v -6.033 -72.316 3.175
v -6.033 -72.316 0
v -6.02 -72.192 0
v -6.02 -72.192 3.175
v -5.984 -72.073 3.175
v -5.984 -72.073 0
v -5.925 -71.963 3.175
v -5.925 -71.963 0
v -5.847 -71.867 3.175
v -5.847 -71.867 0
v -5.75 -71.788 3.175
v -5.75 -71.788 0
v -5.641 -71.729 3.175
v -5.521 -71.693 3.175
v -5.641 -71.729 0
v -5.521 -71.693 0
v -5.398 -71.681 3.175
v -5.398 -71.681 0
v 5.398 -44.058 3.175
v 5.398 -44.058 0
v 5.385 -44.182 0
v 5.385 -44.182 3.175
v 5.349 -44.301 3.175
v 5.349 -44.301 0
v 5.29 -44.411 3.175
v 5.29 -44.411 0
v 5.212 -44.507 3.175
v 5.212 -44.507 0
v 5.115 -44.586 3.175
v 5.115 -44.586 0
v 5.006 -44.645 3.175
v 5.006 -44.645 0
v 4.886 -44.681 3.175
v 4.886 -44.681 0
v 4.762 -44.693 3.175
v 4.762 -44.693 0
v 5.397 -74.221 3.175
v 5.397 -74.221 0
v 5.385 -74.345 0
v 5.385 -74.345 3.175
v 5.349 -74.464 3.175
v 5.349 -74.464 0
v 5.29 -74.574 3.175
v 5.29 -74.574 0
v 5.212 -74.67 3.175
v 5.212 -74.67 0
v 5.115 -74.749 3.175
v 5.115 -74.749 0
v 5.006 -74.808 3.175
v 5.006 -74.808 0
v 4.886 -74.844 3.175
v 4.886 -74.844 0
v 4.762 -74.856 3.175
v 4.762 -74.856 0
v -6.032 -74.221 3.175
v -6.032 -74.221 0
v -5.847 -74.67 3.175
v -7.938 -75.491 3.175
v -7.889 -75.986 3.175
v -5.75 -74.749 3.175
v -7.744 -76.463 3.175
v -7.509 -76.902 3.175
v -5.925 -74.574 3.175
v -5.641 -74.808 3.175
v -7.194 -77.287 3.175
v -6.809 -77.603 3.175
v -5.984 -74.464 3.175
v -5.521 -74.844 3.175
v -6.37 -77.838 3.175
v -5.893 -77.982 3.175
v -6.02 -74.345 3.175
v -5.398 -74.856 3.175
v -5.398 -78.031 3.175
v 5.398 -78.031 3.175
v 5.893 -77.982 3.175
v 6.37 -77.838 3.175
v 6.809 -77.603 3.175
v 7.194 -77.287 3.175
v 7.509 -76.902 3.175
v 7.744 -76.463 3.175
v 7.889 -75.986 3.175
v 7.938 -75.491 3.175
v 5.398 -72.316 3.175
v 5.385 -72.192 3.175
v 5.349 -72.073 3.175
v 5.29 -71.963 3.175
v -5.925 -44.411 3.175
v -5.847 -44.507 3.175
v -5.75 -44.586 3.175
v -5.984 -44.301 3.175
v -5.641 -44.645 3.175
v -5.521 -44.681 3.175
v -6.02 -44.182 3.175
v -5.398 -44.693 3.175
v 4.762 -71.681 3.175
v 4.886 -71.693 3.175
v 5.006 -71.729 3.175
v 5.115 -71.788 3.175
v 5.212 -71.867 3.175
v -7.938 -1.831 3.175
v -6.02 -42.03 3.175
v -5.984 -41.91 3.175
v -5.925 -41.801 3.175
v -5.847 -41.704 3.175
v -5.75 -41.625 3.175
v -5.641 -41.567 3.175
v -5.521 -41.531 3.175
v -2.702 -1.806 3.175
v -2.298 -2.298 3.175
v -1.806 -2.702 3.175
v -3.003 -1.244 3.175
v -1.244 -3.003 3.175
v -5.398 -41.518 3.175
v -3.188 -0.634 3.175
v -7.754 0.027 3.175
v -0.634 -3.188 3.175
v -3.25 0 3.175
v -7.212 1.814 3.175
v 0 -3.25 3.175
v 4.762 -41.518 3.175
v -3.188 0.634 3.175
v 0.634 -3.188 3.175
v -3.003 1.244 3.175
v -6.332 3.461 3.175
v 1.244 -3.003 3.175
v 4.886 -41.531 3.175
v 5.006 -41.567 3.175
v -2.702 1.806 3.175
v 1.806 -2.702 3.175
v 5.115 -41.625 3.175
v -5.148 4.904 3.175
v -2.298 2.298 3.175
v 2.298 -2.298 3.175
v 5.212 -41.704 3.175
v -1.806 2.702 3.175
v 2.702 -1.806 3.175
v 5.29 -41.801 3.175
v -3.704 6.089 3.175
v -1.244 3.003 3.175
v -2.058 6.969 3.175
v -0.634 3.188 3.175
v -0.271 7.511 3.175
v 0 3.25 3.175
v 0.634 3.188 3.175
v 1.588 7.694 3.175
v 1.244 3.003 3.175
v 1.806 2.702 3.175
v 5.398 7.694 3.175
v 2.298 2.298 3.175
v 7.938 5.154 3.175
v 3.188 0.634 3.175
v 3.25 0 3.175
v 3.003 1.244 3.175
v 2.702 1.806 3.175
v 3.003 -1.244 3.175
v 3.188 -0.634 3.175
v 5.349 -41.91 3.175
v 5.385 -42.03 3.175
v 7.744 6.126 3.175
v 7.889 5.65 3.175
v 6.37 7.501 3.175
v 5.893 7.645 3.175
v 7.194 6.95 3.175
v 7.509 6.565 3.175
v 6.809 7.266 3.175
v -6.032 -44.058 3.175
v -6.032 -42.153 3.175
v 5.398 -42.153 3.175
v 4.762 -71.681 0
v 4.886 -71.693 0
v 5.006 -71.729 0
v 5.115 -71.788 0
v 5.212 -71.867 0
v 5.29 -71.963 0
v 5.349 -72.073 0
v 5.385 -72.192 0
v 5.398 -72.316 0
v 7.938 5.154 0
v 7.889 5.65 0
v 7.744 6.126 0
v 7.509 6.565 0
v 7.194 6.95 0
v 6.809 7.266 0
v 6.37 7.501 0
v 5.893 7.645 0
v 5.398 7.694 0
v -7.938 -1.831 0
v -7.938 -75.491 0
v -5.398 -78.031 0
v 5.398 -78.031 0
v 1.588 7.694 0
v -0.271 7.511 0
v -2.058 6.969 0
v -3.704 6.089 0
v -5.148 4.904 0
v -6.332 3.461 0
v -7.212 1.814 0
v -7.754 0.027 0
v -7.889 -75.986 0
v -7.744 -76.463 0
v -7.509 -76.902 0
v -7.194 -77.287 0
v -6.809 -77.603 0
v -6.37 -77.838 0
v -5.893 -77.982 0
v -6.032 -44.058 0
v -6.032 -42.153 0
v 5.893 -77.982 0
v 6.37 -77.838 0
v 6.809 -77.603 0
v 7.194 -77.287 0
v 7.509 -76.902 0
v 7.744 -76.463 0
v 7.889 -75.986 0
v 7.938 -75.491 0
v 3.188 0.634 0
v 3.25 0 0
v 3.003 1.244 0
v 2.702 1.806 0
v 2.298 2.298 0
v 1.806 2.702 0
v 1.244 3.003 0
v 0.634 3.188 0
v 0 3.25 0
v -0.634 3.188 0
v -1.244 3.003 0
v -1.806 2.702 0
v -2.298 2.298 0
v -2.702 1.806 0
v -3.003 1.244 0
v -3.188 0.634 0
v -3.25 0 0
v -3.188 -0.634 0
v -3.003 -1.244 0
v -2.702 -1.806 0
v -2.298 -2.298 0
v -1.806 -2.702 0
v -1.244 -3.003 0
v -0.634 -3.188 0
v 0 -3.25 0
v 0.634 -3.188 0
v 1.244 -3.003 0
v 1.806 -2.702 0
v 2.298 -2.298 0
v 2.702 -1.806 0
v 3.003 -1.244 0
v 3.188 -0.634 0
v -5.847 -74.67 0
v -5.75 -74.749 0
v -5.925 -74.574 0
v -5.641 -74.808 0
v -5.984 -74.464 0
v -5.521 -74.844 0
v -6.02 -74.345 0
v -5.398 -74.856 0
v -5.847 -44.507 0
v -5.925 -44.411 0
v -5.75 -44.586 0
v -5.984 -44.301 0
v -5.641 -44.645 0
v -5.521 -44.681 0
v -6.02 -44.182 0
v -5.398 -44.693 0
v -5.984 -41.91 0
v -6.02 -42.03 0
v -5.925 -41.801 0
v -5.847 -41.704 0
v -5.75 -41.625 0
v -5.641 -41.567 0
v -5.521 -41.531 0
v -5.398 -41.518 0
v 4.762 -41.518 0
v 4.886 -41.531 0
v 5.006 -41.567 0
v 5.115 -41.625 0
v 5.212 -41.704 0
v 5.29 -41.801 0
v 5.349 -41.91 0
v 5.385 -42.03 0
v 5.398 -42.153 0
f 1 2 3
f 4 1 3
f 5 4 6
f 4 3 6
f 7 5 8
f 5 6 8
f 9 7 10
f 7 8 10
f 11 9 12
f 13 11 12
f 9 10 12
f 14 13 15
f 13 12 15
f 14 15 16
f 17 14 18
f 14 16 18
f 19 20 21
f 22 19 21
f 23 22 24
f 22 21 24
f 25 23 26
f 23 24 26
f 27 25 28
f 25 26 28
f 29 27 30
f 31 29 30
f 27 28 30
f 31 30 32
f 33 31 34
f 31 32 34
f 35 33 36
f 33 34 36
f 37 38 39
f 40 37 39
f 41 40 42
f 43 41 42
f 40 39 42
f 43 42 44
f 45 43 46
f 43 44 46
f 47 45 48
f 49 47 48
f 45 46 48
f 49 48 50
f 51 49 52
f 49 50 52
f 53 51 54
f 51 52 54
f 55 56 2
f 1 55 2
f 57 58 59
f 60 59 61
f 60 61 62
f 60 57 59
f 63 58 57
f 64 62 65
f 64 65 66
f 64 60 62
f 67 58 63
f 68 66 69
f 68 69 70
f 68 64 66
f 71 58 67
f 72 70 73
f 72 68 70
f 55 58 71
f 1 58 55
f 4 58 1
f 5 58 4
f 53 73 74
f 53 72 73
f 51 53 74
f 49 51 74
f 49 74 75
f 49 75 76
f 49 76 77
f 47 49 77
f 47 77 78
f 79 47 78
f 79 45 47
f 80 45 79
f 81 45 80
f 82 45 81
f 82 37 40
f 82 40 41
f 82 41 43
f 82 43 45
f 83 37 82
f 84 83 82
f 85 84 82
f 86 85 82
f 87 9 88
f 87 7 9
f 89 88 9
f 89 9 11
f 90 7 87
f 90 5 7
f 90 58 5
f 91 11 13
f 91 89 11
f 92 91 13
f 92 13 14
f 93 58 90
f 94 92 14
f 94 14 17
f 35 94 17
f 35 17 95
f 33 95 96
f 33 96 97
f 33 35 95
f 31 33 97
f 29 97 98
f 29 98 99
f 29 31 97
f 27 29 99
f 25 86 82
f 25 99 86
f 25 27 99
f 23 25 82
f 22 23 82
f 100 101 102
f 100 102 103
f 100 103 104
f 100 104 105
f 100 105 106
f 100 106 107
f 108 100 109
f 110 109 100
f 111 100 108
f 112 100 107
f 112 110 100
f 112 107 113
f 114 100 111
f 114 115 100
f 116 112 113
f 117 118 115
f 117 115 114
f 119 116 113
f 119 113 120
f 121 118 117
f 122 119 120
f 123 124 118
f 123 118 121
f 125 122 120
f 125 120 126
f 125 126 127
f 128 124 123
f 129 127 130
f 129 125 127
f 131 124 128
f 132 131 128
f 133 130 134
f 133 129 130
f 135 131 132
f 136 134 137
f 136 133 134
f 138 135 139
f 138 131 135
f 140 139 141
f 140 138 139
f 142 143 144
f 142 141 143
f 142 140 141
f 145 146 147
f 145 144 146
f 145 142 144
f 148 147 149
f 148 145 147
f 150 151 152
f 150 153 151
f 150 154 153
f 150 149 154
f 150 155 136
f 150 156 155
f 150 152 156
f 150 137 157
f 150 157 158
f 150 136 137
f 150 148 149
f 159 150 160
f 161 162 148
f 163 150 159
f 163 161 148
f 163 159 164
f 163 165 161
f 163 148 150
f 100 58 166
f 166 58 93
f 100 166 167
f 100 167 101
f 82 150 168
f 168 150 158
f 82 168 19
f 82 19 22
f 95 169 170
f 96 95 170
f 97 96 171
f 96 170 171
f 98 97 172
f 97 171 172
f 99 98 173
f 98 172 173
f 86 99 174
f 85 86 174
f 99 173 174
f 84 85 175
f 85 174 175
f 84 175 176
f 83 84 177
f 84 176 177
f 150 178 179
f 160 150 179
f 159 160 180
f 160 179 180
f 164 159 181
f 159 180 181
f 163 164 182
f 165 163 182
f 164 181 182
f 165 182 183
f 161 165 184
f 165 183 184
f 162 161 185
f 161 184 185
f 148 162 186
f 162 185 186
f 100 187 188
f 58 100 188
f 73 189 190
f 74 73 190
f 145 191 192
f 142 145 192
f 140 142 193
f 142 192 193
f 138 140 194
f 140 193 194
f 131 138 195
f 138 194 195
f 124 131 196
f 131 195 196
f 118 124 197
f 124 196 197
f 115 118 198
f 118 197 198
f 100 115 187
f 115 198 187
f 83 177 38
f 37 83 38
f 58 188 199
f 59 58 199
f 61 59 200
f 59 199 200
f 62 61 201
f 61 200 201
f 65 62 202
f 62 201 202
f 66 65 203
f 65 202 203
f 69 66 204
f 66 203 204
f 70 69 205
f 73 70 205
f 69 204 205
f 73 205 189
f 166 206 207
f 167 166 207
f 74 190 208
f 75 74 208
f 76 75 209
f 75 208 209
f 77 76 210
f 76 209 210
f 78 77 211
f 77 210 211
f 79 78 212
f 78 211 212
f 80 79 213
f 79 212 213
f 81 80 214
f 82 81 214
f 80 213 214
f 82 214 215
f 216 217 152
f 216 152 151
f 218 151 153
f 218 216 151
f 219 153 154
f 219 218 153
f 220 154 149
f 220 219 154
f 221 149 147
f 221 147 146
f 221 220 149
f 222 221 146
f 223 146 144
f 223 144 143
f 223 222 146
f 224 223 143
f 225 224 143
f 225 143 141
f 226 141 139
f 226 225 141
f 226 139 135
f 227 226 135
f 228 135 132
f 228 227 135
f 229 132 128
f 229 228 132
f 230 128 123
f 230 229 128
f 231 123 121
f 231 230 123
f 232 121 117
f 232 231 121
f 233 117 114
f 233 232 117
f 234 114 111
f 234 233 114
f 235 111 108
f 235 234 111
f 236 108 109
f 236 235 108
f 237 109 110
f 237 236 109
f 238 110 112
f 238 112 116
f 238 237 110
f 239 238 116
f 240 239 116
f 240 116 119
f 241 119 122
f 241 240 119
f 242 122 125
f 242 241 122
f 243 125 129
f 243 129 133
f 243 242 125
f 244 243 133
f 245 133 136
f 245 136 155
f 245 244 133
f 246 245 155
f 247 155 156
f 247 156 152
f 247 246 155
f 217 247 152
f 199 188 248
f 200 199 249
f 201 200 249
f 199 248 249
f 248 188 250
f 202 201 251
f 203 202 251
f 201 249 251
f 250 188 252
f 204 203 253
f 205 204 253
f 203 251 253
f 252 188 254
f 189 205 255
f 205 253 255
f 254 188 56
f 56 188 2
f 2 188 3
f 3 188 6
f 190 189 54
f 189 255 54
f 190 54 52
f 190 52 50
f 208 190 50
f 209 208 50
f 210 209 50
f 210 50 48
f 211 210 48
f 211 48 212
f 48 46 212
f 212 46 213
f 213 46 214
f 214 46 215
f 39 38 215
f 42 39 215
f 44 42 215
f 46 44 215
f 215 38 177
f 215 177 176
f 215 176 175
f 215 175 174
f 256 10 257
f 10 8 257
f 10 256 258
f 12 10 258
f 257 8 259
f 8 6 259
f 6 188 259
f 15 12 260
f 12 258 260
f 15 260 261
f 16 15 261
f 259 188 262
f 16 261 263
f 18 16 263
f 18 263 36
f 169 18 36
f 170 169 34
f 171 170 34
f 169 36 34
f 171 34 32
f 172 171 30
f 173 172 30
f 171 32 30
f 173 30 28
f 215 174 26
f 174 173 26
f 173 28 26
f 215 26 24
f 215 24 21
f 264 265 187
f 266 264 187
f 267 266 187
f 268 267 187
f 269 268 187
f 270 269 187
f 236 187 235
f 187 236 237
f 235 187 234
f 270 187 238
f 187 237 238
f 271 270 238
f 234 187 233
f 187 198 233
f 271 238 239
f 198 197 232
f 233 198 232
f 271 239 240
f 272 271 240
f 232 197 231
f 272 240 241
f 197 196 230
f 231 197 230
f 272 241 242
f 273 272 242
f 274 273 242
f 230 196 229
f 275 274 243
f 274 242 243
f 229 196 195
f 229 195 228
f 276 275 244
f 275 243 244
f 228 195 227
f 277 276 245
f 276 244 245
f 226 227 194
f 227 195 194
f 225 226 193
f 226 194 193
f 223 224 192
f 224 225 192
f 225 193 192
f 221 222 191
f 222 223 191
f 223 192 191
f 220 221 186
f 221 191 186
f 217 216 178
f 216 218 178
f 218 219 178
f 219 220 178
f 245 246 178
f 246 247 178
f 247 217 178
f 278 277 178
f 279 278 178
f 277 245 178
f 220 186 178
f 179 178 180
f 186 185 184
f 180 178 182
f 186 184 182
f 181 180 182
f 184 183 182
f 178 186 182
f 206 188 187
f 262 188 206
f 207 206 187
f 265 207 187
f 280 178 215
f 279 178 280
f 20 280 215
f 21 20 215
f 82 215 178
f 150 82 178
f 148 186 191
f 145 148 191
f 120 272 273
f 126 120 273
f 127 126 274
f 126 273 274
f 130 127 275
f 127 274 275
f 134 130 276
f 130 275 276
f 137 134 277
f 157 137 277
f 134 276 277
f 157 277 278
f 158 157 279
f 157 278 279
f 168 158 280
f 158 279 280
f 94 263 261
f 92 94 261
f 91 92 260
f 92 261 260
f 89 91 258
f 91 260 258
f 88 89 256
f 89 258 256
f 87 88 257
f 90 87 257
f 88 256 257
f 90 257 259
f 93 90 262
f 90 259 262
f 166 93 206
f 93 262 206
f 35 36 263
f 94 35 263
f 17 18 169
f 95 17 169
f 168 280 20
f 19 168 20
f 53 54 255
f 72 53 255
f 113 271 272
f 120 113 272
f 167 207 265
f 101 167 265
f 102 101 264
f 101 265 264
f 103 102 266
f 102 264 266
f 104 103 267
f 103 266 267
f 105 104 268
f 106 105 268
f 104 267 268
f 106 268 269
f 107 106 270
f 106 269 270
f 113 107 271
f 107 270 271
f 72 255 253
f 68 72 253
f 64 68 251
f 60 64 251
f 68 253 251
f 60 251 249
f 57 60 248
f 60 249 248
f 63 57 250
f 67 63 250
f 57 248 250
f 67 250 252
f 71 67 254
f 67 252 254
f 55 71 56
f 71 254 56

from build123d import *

# Parameters (mm, degrees)
SKETCH1_R           = 3.25
BOSS_EXTRUDE1_DEPTH = 3.175


with BuildPart() as part:
    # Sketch1 → Boss-Extrude1 (new body)
    with BuildSketch(Plane.XY):
        with BuildLine():
            Line((-7.9375, -1.830947062), (-7.9375, -75.490947062))
            ThreePointArc((-7.9375, -75.490947062), (-7.193551224, -77.286998286), (-5.3975, -78.030947062))
            Line((-5.3975, -78.030947062), (5.3975, -78.030947062))
            ThreePointArc((5.3975, -78.030947062), (7.193551224, -77.286998286), (7.9375, -75.490947062))
            Line((7.9375, -75.490947062), (7.9375, 5.154052938))
            ThreePointArc((7.9375, 5.154052938), (7.193551224, 6.950104162), (5.3975, 7.694052938))
            Line((5.3975, 7.694052938), (1.5875, 7.694052938))
            ThreePointArc((1.5875, 7.694052938), (-5.147692091, 4.904245029), (-7.9375, -1.830947062))
        make_face()
        Circle(SKETCH1_R, mode=Mode.SUBTRACT)
        with BuildLine():
            Line((-5.3975, -71.680947062), (4.7625, -71.680947062))
            ThreePointArc((4.7625, -71.680947062), (5.211512806, -71.866934256), (5.3975, -72.315947062))
            Line((5.3975, -72.315947062), (5.3975, -74.220947062))
            ThreePointArc((5.3975, -74.220947062), (5.211512806, -74.669959868), (4.7625, -74.855947062))
            Line((4.7625, -74.855947062), (-5.3975, -74.855947062))
            ThreePointArc((-5.3975, -74.855947062), (-5.846512806, -74.669959868), (-6.0325, -74.220947062))
            Line((-6.0325, -74.220947062), (-6.0325, -72.315947062))
            ThreePointArc((-6.0325, -72.315947062), (-5.846512806, -71.866934256), (-5.3975, -71.680947062))
        make_face(mode=Mode.SUBTRACT)
        with BuildLine():
            Line((-5.3975, -41.518447062), (4.7625, -41.518447062))
            ThreePointArc((4.7625, -41.518447062), (5.211512806, -41.704434256), (5.3975, -42.153447062))
            Line((5.3975, -42.153447062), (5.3975, -44.058447062))
            ThreePointArc((5.3975, -44.058447062), (5.211512806, -44.507459868), (4.7625, -44.693447062))
            Line((4.7625, -44.693447062), (-5.3975, -44.693447062))
            ThreePointArc((-5.3975, -44.693447062), (-5.846512806, -44.507459868), (-6.0325, -44.058447062))
            Line((-6.0325, -44.058447062), (-6.0325, -42.153447062))
            ThreePointArc((-6.0325, -42.153447062), (-5.846512806, -41.704434256), (-5.3975, -41.518447062))
        make_face(mode=Mode.SUBTRACT)
    extrude(amount=BOSS_EXTRUDE1_DEPTH)


solid = part.part
